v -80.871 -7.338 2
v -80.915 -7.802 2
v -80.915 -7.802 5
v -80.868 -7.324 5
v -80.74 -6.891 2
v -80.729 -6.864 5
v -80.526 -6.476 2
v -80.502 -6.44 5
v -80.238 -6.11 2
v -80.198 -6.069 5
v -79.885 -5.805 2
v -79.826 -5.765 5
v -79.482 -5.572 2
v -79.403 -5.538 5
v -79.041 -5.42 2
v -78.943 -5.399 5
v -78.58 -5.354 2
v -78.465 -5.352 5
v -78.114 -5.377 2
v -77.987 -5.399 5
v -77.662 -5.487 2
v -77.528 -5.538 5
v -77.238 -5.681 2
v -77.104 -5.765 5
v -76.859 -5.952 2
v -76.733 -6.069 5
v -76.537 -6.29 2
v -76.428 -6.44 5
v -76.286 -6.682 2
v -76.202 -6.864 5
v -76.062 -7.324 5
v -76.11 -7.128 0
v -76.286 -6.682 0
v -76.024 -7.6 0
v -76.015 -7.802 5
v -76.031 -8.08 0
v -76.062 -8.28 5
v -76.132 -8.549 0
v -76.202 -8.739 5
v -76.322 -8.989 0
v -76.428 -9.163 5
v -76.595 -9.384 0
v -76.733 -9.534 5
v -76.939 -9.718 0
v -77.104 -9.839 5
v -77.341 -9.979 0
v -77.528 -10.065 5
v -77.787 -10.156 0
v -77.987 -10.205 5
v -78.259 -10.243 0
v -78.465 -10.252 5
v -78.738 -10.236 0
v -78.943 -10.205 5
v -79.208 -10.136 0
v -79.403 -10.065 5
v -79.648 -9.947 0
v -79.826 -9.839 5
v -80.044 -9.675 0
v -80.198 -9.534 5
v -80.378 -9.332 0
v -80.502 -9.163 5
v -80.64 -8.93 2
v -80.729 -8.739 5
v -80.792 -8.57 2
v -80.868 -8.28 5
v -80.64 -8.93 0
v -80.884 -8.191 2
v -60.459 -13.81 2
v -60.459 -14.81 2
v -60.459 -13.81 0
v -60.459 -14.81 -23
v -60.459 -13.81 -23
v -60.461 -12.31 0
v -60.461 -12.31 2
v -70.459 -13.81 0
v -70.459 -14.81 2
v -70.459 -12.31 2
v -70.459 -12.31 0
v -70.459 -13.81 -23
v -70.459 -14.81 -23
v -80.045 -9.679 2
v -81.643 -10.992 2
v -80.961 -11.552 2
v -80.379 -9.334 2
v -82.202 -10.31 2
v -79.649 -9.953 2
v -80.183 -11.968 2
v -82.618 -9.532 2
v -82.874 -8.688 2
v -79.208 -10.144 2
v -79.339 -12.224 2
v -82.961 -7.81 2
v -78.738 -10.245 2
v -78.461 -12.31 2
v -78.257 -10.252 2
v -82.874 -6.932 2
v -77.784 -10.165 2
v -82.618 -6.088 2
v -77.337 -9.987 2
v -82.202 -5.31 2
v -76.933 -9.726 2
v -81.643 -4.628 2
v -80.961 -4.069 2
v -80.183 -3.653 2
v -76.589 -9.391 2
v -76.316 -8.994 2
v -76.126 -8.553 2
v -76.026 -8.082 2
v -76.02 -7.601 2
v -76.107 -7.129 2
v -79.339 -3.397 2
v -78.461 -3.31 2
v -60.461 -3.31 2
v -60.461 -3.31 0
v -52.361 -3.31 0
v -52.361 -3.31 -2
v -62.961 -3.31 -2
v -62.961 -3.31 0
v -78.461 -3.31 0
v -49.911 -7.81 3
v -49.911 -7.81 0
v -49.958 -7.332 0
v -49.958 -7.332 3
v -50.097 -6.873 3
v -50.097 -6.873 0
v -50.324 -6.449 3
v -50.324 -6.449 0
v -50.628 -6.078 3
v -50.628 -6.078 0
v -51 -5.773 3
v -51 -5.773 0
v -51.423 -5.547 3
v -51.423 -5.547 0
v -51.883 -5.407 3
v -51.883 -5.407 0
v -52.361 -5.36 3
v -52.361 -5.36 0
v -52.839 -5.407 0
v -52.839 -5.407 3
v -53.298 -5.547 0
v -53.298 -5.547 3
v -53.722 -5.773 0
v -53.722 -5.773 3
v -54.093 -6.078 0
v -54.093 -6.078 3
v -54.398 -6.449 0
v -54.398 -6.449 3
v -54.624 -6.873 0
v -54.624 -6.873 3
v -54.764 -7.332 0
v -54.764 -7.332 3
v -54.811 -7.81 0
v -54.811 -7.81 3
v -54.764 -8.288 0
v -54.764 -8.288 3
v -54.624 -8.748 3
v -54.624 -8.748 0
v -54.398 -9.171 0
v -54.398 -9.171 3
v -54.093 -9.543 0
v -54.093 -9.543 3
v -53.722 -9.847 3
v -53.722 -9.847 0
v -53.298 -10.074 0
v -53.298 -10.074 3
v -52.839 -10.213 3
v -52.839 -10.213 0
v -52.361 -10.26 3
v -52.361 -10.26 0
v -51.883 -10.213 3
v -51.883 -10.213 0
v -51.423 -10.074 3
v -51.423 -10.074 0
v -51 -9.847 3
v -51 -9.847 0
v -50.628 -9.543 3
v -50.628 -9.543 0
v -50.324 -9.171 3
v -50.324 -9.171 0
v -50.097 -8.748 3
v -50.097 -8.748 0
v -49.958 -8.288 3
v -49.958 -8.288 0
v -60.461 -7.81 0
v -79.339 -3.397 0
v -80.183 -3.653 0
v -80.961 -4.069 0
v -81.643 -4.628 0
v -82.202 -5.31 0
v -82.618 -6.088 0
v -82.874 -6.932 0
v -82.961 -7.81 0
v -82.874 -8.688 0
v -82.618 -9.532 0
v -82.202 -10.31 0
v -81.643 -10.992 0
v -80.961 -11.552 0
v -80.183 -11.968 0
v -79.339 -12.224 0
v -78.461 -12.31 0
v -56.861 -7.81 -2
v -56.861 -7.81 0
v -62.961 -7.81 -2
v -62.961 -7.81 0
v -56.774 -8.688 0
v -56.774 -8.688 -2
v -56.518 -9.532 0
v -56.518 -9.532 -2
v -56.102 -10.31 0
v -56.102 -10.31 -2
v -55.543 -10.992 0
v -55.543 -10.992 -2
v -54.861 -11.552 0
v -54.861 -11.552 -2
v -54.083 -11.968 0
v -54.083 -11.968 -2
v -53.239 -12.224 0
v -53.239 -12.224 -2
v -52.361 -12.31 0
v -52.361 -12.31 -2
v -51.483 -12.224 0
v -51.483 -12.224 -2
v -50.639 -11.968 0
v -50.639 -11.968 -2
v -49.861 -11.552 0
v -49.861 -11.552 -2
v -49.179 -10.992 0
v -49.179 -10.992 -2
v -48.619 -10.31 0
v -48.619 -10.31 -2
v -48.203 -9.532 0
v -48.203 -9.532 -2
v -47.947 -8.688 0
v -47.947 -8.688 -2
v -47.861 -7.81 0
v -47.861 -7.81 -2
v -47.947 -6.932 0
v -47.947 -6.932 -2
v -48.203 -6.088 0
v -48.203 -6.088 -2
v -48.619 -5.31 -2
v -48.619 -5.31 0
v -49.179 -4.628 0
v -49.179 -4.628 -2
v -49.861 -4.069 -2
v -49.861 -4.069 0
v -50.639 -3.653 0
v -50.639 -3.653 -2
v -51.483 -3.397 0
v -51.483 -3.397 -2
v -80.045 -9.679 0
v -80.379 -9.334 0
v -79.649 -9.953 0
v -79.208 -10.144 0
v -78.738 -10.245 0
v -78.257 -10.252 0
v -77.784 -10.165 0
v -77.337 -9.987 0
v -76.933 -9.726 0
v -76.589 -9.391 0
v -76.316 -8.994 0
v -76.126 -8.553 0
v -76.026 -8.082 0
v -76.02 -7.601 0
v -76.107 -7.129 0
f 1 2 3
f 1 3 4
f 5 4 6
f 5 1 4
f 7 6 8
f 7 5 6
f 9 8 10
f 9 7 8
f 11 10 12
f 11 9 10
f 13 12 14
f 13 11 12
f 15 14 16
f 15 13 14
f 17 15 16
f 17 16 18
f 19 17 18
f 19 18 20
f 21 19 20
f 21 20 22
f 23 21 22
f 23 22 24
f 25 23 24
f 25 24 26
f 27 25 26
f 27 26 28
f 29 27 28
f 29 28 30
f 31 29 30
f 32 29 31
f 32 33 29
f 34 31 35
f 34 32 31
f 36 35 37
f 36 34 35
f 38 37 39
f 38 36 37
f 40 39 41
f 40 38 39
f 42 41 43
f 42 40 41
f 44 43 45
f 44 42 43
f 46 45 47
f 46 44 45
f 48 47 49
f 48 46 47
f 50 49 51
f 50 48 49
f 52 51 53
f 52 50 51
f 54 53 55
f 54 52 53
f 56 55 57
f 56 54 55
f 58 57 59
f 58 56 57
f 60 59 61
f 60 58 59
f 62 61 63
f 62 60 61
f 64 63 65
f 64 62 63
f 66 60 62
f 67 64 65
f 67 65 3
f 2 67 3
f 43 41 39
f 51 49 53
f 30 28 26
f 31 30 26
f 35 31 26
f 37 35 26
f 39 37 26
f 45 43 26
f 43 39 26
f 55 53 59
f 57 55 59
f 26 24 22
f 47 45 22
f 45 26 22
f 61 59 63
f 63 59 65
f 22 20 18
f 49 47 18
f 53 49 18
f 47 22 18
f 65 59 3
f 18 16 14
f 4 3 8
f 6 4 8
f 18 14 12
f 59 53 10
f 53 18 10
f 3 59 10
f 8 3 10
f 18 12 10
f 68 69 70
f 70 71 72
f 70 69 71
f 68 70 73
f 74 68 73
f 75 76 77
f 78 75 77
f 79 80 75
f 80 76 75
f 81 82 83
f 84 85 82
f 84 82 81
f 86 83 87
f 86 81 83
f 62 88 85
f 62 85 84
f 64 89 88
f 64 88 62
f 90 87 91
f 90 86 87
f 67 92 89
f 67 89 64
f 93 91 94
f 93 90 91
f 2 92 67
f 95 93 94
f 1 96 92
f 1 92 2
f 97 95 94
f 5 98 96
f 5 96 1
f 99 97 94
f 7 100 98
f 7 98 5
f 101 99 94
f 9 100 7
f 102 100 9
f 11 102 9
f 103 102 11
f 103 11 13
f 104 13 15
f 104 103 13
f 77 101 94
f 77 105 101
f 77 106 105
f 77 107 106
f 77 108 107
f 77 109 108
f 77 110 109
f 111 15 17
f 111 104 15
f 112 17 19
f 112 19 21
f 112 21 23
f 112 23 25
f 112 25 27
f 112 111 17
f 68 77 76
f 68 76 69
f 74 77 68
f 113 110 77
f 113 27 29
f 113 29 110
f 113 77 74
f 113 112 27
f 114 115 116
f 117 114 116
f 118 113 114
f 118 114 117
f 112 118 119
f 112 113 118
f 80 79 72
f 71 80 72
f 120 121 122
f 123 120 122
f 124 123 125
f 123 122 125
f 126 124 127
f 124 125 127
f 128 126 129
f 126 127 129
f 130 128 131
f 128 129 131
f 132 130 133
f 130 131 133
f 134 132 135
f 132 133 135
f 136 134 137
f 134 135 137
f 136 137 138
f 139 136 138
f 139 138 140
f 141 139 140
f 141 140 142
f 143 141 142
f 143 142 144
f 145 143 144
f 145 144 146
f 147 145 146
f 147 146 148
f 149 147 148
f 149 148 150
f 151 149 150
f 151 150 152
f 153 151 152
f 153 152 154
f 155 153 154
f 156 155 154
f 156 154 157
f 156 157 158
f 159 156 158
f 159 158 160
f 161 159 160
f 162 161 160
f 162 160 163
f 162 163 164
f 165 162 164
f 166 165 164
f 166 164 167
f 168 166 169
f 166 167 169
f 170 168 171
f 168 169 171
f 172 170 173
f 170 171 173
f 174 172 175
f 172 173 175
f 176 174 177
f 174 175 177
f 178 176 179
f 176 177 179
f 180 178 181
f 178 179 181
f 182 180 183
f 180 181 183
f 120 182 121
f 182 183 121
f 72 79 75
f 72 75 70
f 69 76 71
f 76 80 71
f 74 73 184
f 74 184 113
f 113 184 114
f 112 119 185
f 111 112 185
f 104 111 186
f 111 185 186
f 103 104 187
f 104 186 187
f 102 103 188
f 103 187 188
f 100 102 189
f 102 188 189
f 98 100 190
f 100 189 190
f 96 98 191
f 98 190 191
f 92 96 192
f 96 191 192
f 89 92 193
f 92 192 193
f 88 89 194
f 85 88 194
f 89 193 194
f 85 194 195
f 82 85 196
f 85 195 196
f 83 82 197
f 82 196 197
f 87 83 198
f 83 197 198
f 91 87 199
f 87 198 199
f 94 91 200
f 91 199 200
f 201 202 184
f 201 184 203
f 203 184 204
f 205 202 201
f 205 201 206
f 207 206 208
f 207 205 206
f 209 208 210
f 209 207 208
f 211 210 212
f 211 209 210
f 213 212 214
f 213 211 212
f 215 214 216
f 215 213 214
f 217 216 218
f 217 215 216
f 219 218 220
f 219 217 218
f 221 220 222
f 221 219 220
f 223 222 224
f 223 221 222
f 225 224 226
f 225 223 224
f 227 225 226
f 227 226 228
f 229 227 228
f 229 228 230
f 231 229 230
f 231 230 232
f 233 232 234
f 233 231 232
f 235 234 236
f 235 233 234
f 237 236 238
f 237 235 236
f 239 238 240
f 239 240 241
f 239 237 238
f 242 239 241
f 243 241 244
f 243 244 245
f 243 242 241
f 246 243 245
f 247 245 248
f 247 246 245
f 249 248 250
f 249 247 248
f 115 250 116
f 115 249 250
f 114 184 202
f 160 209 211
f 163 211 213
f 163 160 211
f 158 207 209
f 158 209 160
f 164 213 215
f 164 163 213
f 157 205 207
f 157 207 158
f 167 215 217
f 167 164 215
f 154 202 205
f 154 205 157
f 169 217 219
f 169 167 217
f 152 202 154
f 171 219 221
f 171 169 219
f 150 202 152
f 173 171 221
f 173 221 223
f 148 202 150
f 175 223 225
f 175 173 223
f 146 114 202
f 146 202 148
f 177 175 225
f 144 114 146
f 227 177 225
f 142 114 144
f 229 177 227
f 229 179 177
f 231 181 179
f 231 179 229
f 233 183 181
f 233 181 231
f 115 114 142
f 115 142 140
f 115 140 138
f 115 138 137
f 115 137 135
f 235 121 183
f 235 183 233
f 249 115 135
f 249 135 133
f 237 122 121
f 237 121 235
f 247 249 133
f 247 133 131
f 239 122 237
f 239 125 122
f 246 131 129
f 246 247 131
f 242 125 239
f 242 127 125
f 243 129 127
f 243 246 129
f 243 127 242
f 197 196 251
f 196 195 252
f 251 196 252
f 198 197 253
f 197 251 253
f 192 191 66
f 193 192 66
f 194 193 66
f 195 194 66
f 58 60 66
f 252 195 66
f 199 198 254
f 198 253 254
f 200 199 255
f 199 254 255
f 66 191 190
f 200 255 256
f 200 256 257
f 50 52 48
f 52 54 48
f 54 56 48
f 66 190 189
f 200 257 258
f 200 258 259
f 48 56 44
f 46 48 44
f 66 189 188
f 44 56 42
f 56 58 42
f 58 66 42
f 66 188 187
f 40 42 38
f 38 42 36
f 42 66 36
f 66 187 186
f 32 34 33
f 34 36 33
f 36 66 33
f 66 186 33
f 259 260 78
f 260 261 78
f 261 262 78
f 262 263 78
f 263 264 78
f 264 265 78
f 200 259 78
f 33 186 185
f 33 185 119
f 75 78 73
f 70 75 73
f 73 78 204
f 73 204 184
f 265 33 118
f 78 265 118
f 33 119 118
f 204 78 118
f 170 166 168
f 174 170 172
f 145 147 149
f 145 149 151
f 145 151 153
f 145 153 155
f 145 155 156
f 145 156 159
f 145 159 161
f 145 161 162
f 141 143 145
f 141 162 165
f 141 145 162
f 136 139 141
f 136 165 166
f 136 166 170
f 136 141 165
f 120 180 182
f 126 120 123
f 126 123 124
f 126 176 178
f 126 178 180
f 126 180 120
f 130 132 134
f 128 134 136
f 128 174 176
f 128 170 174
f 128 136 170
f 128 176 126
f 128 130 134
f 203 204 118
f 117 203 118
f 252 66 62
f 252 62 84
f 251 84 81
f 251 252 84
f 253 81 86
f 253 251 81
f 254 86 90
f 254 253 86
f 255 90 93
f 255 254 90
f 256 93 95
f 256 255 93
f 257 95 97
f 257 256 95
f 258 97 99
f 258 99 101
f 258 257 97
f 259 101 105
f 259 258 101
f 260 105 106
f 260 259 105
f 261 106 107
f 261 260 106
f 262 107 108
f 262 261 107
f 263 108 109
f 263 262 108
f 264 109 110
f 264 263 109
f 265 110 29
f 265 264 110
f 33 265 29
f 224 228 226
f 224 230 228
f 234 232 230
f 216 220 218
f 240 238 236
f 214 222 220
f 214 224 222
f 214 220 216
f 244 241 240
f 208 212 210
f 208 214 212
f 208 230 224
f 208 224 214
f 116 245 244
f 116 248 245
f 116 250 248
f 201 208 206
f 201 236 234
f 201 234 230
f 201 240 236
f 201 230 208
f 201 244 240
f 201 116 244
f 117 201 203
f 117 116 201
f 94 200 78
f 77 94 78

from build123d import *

# Parameters (mm, degrees)
SKETCH_1_R       = 2.45
EXTRUDE_2_DEPTH  = 2
SKETCH_1_5_R     = 2.45
EXTRUDE_3_DEPTH  = 2
SKETCH_8_R       = 2.45
EXTRUDE_5_DEPTH  = 3
SKETCH_10_R      = 2.529452546
EXTRUDE_6_DEPTH  = 2
SKETCH_11_W      = 2.5
SKETCH_11_H      = 4.5
EXTRUDE_7_DEPTH  = 2
SKETCH_1_7_W     = 10
SKETCH_1_7_H     = 1
EXTRUDE_8_DEPTH  = 23
SKETCH_13_W      = 10
SKETCH_13_H      = 1
EXTRUDE_9_DEPTH  = 2
SKETCH_21_R      = 2.45
EXTRUDE_10_DEPTH = 5


with BuildPart() as part:
    # 草图1 → 凸台-拉伸2 (new body)
    with BuildSketch(Plane.XY):
        with BuildLine():
            Line((-52.360741066, -3.31033927), (-60.460741066, -3.31033927))
            Line((-60.460741066, -3.31033927), (-60.460741066, -7.81033927))
            Line((-60.460741066, -7.81033927), (-56.860741066, -7.81033927))
            ThreePointArc((-56.860741066, -7.81033927), (-49.178760551, -10.992319786), (-52.360741066, -3.31033927))
        make_face()
        with Locations((-52.360741066, -7.81033927)):
            Circle(SKETCH_1_R, mode=Mode.SUBTRACT)
    extrude(amount=-EXTRUDE_2_DEPTH)



with BuildPart() as body_2:
    # 草图1<5> → 凸台-拉伸3 (new body)
    with BuildSketch(Plane.XY):
        with BuildLine():
            Line((-78.460741066, -12.31033927), (-70.458584645, -12.31033927))
            Line((-70.458584645, -12.31033927), (-70.458584645, -13.81033927))
            Line((-70.458584645, -13.81033927), (-60.458584645, -13.81033927))
            Line((-60.458584645, -13.81033927), (-60.460741066, -12.31033927))
            Line((-60.460741066, -12.31033927), (-60.460741066, -7.81033927))
            Line((-60.460741066, -7.81033927), (-60.460741066, -3.31033927))
            Line((-60.460741066, -3.31033927), (-78.460741066, -3.31033927))
            ThreePointArc((-78.460741066, -3.31033927), (-82.960741066, -7.81033927), (-78.460741066, -12.31033927))
        make_face()
        with Locations((-78.460741066, -7.81033927)):
            Circle(SKETCH_1_5_R, mode=Mode.SUBTRACT)
    extrude(amount=EXTRUDE_3_DEPTH)


with BuildPart() as body_3:
    # 草图8 → 凸台-拉伸5 (new body)
    with BuildSketch(Plane.XY):
        with Locations((-52.360741066, -7.81033927)):
            Circle(SKETCH_8_R)
    extrude(amount=EXTRUDE_5_DEPTH)


with BuildPart() as part_1:
    add(part.part)

    add(body_3.part)  # 凸台-拉伸6 merges body 3
    # 草图10 → 凸台-拉伸6 (add)
    with BuildSketch(Plane.XY):
        with Locations((-52.43882399, -7.795650359)):
            Circle(SKETCH_10_R)
    extrude(amount=-EXTRUDE_6_DEPTH)


    add(body_2.part)  # 凸台-拉伸7 merges body 2
    # 草图11 → 凸台-拉伸7 (add)
    with BuildSketch(Plane(origin=(0, 0, 0), x_dir=(-1, 0, 0), z_dir=(0, 0, -1))):
        with Locations((61.710741066, -5.56033927)):
            Rectangle(SKETCH_11_W, SKETCH_11_H)
    extrude(amount=EXTRUDE_7_DEPTH)



with BuildPart() as body_2_2:
    # 草图1<7> → 凸台-拉伸8 (new body)
    with BuildSketch(Plane.XY):
        with Locations((-65.458584645, -14.31033927)):
            Rectangle(SKETCH_1_7_W, SKETCH_1_7_H)
    extrude(amount=-EXTRUDE_8_DEPTH)


with BuildPart() as part_2:
    add(part_1.part)

    add(body_2_2.part)  # 凸台-拉伸9 merges body 2 2
    # 草图13 → 凸台-拉伸9 (add)
    with BuildSketch(Plane.XY):
        with Locations((-65.458584645, -14.31033927)):
            Rectangle(SKETCH_13_W, SKETCH_13_H)
    extrude(amount=EXTRUDE_9_DEPTH)

    # 草图21 → 凸台-拉伸10 (add)
    with BuildSketch(Plane(origin=(0, 0, 0), x_dir=(-1, 0, 0), z_dir=(0, 0, -1))):
        with Locations((78.465233983, -7.801636169)):
            Circle(SKETCH_21_R)
    extrude(amount=-EXTRUDE_10_DEPTH)


solid = part_2.part
